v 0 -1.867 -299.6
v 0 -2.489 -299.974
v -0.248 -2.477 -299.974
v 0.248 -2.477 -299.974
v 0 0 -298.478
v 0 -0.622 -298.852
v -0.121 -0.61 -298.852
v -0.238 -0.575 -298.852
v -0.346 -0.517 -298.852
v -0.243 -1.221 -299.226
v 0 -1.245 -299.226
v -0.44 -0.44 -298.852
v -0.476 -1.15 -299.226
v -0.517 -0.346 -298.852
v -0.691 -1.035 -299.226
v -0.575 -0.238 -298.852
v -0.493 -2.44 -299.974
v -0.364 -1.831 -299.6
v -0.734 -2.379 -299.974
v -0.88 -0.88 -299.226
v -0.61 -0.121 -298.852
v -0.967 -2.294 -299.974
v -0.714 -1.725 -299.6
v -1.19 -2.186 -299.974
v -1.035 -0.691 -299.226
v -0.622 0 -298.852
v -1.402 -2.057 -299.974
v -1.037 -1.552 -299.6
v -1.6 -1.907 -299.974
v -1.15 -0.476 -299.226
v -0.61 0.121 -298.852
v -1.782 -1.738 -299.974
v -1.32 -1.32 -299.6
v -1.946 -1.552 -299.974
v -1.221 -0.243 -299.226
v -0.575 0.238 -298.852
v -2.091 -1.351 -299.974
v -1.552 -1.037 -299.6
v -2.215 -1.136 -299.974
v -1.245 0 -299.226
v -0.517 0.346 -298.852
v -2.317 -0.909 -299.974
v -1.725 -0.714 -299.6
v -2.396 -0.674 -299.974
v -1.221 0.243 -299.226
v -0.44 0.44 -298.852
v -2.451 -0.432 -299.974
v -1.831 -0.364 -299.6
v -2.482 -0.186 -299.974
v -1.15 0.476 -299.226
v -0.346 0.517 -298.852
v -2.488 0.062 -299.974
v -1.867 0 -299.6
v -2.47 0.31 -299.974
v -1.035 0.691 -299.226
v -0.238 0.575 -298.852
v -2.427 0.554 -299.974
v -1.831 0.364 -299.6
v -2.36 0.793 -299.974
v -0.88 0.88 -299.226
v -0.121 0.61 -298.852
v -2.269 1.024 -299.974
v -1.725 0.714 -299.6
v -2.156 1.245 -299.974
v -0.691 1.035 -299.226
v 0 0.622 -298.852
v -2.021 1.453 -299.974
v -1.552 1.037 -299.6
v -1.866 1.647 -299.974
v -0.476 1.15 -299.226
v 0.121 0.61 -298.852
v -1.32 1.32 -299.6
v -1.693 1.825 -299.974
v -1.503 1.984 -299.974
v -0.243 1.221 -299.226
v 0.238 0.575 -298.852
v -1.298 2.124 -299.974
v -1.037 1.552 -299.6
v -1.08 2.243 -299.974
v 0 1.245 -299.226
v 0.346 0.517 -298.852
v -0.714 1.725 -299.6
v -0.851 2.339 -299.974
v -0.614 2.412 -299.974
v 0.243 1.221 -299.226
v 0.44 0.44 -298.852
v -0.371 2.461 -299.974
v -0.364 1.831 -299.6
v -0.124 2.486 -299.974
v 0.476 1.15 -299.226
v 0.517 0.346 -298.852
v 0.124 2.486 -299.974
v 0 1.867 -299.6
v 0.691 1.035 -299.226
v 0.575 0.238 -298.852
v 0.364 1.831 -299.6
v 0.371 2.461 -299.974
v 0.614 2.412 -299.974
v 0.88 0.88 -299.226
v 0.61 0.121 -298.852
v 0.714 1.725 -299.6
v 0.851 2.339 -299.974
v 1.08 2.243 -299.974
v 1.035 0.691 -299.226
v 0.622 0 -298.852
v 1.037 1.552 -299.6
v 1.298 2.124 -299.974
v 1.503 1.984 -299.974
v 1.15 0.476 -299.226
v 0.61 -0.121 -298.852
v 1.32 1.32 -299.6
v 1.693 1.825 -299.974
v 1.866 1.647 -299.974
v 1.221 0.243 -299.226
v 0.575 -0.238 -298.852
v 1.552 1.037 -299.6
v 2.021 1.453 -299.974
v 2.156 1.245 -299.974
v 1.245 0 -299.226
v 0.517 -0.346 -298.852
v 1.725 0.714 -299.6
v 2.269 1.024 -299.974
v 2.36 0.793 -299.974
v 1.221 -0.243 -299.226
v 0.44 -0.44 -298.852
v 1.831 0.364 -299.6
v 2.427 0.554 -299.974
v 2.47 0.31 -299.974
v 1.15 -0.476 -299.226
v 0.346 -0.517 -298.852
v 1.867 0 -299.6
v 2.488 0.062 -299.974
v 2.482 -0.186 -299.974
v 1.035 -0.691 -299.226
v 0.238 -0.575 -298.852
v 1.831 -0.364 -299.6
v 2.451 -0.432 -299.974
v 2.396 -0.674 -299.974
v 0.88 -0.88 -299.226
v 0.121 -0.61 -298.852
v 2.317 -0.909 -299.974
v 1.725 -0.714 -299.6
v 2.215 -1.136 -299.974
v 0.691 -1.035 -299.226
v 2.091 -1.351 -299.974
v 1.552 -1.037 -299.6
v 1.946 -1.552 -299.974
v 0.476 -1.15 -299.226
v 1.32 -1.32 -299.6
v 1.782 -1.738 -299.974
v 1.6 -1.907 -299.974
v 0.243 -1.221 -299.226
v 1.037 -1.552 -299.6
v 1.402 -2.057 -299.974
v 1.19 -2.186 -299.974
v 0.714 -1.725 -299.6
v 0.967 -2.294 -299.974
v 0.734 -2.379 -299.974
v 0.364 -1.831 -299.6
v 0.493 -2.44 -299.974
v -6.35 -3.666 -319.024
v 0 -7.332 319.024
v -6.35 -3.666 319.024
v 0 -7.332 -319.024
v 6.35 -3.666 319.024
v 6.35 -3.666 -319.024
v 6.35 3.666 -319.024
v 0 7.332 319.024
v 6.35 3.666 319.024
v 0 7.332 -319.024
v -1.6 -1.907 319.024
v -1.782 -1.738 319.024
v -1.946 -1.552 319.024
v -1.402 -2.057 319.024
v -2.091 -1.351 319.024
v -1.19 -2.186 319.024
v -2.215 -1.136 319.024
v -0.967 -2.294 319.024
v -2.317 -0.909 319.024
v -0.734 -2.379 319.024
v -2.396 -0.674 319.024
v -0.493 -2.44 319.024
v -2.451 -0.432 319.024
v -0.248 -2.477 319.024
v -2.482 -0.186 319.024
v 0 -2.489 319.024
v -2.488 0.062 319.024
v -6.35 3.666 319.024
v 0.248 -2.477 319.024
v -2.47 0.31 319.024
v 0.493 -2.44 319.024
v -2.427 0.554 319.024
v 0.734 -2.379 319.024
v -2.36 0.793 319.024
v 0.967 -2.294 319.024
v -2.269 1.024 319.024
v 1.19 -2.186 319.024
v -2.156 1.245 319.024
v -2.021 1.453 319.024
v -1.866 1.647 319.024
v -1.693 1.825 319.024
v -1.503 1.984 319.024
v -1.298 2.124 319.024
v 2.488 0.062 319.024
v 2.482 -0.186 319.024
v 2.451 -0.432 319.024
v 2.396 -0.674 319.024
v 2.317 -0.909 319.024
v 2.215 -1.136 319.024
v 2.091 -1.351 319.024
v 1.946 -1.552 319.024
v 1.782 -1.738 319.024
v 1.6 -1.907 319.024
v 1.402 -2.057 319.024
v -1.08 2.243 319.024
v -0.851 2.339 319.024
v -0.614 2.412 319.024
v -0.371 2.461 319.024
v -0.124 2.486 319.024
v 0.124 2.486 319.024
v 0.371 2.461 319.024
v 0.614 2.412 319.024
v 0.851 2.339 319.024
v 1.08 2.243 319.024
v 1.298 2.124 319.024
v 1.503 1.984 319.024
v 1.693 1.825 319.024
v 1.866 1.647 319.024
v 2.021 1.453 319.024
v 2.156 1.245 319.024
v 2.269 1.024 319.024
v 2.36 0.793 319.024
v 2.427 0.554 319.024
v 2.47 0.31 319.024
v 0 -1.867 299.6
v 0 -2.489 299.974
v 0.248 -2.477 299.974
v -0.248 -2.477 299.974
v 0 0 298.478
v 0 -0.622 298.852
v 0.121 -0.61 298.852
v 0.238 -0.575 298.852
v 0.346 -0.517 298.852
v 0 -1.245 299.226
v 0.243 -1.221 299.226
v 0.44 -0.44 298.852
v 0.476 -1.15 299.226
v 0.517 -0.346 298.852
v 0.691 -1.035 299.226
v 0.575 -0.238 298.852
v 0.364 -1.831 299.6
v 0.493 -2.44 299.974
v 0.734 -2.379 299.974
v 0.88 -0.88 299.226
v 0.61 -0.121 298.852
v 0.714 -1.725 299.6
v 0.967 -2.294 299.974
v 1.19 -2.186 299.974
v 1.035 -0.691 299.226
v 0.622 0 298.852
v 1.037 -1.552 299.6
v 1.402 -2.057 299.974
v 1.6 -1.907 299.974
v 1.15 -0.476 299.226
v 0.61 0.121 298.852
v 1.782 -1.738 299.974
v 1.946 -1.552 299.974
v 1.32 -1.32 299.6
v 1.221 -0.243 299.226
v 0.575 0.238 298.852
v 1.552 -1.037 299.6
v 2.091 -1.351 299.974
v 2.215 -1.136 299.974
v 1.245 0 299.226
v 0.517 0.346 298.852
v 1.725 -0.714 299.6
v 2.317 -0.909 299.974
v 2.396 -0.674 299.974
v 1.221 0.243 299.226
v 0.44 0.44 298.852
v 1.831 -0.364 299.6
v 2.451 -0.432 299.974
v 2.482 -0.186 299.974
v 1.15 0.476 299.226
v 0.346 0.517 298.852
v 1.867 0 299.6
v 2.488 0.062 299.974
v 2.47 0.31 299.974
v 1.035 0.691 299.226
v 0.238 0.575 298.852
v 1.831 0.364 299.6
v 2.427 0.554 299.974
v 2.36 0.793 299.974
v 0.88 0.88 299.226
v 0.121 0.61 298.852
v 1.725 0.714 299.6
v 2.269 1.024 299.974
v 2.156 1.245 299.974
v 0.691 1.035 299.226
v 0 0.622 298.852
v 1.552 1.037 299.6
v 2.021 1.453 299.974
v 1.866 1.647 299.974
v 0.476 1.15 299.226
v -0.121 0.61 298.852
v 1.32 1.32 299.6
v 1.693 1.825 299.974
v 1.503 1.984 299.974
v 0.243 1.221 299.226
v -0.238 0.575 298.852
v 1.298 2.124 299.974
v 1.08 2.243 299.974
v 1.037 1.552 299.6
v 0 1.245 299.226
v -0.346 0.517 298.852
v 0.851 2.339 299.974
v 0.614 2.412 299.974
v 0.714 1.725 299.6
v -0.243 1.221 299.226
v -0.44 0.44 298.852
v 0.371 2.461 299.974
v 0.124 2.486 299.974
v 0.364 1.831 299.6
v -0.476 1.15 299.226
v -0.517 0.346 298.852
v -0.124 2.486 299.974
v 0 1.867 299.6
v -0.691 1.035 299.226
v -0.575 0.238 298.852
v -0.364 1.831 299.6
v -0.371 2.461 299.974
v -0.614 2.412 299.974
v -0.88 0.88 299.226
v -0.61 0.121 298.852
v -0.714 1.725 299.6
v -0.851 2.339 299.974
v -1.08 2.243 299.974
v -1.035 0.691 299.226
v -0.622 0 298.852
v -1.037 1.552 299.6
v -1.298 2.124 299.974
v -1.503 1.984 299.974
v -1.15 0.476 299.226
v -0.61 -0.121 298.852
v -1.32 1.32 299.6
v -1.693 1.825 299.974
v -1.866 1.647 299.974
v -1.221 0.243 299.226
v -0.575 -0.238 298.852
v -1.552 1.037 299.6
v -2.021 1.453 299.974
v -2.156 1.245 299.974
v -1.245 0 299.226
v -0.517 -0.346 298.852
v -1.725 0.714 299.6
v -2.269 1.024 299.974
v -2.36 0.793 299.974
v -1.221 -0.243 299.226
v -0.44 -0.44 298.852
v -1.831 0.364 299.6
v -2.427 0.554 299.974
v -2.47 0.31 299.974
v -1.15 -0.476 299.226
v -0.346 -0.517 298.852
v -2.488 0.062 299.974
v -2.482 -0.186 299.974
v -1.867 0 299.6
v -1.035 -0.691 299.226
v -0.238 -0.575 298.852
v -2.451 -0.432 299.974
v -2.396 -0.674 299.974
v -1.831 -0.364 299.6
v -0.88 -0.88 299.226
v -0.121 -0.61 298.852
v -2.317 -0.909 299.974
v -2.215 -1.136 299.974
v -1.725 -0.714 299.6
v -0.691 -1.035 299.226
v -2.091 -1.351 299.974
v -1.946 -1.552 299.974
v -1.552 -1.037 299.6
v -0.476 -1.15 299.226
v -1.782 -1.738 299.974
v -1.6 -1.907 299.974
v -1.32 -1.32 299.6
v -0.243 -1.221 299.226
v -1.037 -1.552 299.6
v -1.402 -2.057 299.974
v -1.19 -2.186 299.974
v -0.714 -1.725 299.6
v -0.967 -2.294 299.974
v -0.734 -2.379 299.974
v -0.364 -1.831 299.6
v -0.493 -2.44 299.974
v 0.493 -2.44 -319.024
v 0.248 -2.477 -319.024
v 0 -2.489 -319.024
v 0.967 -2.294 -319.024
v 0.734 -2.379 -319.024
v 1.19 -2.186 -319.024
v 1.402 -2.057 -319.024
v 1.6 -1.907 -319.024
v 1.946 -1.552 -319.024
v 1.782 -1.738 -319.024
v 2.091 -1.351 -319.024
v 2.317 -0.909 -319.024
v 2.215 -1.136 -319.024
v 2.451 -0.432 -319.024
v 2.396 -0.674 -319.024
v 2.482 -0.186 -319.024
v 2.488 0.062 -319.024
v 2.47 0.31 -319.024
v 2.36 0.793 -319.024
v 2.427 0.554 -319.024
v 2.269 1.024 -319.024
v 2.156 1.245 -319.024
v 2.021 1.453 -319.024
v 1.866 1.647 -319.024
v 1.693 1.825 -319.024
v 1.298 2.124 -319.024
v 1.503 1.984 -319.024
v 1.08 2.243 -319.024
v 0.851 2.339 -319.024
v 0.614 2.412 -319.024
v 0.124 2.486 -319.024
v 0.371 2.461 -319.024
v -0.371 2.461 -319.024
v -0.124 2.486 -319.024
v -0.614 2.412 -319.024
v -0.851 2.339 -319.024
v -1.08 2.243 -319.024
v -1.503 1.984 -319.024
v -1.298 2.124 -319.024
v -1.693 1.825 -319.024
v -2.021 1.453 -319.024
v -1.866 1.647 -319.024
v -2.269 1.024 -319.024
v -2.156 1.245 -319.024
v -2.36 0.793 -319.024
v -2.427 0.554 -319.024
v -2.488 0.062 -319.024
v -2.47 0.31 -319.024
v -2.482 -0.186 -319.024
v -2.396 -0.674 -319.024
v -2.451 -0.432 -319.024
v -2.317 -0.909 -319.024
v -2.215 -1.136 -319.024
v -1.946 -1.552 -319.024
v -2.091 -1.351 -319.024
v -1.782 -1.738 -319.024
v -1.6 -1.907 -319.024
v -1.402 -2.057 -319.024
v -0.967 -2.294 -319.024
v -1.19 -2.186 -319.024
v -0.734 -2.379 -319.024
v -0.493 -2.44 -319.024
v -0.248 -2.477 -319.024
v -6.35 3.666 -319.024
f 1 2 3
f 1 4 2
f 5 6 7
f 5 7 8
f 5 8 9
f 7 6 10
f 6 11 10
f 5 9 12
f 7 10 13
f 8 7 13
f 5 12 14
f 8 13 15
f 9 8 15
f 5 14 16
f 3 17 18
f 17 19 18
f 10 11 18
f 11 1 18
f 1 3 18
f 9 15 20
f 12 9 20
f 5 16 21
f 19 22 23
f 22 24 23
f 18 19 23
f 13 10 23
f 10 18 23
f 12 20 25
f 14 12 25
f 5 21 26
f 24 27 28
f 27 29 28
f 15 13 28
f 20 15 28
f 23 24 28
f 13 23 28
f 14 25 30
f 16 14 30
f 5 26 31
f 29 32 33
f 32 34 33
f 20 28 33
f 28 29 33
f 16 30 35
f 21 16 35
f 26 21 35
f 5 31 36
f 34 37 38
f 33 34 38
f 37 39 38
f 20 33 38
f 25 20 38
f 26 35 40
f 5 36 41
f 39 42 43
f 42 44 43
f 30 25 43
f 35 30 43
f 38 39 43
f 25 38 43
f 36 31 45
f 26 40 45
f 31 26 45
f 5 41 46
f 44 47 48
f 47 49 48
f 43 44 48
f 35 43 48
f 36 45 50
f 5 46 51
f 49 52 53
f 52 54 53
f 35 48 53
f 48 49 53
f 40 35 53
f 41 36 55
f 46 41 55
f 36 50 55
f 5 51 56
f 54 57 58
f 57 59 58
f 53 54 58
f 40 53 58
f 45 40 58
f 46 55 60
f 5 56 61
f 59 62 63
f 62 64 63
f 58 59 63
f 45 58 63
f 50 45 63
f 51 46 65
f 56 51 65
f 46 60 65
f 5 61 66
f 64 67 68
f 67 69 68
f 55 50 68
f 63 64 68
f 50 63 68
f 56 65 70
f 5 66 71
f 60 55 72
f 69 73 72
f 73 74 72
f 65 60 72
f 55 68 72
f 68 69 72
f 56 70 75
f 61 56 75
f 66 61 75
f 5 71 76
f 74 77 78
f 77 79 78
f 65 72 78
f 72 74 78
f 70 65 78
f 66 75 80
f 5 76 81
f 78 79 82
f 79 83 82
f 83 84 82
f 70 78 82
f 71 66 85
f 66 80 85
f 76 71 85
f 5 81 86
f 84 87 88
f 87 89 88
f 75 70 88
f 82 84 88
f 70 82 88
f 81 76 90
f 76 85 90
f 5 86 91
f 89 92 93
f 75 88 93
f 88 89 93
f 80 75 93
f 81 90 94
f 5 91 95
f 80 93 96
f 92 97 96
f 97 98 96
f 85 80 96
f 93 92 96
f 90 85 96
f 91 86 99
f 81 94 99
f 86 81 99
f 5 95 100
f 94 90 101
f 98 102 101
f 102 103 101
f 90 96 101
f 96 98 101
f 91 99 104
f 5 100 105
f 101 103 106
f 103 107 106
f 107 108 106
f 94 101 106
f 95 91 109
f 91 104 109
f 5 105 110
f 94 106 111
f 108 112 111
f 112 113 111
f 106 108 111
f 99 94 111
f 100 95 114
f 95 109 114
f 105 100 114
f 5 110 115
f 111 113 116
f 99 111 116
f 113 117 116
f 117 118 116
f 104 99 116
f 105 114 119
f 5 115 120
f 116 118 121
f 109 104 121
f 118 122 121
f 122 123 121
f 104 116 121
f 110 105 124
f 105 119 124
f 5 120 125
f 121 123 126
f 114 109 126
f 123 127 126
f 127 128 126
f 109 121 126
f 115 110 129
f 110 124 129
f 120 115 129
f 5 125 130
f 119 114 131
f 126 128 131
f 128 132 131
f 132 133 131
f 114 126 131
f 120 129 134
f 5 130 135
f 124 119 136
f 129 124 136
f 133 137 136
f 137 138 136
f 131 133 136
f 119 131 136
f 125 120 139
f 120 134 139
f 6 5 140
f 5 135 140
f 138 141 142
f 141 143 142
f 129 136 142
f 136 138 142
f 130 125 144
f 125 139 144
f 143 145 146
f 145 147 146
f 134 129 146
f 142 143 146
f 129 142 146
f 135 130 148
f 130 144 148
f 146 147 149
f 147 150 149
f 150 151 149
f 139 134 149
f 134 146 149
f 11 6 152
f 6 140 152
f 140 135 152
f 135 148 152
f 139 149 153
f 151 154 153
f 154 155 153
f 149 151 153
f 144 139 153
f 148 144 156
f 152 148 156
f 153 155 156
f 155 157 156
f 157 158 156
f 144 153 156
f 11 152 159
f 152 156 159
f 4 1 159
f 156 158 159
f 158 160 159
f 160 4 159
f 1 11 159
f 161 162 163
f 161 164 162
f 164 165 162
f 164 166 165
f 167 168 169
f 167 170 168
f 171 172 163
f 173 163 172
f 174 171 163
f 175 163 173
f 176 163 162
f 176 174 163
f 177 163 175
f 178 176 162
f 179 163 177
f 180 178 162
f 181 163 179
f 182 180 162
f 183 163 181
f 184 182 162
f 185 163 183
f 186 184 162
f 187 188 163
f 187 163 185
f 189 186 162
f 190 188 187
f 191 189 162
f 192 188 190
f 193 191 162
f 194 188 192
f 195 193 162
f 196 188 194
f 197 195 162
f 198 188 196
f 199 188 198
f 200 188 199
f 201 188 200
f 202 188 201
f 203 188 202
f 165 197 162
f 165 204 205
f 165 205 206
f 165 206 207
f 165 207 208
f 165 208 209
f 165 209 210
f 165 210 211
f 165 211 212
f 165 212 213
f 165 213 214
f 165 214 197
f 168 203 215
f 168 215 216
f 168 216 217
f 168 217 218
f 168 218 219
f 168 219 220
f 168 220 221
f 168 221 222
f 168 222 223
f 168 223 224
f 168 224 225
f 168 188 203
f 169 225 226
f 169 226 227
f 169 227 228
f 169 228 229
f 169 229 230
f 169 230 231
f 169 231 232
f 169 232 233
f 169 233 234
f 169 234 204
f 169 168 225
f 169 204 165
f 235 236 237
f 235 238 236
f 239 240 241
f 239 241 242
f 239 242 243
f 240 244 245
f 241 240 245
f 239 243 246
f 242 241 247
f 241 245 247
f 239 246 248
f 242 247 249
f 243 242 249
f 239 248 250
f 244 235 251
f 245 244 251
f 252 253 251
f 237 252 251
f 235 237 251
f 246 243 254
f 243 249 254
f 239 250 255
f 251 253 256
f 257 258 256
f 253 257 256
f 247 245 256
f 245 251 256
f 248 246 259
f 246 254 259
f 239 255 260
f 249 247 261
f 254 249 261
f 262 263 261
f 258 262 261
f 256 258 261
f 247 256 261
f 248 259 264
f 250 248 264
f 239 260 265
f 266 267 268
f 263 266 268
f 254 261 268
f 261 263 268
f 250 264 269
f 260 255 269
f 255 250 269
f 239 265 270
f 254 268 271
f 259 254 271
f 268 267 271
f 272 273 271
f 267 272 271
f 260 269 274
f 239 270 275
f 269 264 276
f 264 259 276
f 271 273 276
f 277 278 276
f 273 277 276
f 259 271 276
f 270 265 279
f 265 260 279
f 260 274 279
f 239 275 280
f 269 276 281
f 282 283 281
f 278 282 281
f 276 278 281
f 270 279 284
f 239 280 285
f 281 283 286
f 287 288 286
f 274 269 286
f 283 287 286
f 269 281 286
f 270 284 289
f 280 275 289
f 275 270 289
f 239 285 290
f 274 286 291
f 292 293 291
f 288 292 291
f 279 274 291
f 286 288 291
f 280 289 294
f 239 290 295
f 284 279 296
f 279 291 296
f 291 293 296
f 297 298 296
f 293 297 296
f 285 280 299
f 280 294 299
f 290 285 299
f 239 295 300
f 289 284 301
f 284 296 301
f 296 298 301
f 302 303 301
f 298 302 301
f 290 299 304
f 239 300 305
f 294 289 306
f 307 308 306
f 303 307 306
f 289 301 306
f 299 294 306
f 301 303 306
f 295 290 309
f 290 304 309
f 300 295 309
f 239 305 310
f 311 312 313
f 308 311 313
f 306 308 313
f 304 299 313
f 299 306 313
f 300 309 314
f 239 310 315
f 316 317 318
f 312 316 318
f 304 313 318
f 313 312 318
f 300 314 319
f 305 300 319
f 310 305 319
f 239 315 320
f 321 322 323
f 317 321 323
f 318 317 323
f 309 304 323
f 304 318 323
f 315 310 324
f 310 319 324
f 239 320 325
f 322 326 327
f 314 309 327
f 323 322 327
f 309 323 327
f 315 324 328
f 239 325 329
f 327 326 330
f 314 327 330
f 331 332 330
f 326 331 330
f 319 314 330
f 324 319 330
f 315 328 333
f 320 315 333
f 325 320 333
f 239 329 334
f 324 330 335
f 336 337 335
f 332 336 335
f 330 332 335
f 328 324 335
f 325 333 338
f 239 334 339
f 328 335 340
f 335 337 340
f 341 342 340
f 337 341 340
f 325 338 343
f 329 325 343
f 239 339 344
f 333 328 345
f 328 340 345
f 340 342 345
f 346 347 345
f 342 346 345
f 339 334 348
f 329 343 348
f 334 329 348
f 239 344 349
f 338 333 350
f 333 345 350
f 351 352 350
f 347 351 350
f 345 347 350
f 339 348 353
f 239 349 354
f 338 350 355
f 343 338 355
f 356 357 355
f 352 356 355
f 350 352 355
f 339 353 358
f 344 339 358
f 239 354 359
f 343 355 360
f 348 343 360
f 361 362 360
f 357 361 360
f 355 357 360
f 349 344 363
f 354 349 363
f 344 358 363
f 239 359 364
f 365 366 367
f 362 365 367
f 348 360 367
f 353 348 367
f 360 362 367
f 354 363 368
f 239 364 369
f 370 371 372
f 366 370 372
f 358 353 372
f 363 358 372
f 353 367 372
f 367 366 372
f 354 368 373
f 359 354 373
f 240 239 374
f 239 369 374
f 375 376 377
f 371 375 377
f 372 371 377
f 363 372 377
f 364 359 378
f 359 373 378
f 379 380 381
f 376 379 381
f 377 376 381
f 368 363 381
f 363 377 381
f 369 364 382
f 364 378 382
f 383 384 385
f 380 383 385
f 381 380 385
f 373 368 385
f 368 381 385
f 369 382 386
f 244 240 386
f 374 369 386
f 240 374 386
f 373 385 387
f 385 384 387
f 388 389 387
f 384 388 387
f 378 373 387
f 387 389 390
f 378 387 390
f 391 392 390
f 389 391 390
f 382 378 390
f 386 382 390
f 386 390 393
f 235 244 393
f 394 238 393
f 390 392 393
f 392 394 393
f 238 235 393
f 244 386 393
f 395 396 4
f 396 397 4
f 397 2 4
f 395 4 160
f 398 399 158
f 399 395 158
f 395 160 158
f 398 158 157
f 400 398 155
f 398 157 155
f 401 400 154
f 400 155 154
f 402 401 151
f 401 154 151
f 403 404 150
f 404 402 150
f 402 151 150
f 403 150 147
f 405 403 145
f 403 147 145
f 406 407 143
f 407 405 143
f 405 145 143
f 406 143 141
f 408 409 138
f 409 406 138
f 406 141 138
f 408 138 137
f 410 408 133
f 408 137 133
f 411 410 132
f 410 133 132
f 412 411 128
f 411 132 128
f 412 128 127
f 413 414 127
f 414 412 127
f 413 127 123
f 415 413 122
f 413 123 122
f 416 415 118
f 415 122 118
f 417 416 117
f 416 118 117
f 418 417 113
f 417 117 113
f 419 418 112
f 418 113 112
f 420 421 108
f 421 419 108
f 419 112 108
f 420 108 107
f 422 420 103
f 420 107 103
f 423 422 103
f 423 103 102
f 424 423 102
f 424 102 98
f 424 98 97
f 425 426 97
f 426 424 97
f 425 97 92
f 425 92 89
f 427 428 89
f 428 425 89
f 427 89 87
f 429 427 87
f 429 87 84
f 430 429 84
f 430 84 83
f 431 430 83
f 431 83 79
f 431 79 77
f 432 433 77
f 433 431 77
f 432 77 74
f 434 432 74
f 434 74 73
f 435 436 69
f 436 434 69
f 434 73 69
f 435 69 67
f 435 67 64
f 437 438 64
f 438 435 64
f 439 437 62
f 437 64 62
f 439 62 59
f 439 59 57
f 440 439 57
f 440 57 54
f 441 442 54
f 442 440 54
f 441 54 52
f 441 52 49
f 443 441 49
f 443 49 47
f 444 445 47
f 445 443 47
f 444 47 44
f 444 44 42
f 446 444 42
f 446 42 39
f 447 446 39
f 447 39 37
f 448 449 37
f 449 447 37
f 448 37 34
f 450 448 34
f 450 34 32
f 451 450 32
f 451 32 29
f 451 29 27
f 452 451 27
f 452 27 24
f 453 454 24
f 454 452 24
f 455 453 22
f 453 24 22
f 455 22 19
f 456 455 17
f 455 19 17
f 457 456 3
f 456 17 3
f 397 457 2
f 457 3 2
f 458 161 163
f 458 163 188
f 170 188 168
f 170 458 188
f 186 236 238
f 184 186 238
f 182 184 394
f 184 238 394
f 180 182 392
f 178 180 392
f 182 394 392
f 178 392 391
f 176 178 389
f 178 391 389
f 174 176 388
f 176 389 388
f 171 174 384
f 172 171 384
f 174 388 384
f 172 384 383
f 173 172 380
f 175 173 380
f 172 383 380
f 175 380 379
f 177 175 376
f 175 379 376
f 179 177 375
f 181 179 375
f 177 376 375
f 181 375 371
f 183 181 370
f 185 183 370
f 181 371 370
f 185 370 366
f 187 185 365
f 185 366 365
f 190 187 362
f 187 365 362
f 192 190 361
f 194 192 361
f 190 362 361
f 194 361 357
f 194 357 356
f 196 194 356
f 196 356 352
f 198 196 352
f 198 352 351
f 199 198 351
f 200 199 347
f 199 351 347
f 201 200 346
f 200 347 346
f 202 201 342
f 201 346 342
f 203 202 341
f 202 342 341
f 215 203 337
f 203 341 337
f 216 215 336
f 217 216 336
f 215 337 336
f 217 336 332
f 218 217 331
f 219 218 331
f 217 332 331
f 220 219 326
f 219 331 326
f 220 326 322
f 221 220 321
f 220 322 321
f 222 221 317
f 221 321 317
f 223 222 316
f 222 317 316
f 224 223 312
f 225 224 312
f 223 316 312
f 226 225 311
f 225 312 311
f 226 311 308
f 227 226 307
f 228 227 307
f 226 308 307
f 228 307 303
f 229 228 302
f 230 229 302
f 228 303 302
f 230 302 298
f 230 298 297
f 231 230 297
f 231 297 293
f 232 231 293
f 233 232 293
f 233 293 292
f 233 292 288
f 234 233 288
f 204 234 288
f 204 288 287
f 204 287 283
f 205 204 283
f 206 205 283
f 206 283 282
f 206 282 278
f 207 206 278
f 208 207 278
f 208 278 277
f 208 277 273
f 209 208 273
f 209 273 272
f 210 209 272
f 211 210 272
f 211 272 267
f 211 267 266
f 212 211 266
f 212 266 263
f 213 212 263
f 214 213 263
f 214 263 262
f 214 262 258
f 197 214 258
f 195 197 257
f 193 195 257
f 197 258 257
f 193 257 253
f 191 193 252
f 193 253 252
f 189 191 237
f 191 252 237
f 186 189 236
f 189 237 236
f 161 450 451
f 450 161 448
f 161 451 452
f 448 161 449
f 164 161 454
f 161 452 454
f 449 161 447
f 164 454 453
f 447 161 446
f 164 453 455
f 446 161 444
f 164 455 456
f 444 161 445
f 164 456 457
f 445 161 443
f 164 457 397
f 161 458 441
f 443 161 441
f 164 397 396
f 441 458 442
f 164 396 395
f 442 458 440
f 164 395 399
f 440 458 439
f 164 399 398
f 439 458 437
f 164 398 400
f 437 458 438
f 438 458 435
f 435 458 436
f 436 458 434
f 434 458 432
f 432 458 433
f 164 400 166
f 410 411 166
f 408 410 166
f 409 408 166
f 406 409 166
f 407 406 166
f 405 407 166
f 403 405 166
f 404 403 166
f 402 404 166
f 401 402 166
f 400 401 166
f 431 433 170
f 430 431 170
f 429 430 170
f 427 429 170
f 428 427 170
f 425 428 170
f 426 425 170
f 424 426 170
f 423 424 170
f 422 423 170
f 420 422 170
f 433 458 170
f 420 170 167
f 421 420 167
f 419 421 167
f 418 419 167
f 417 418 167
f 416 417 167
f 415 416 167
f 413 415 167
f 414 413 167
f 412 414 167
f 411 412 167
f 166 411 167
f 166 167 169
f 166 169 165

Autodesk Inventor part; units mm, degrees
ref_plane "YZ Plane" through (0, 0, 0) normal (1, 0, 0) x (0, 1, 0)
ref_plane "XZ Plane" through (0, 0, 0) normal (0, 1, 0) x (-1, 0, 0)
ref_plane "XY Plane" through (0, 0, 0) normal (0, 0, 1) x (1, 0, 0)
sketch "Sketch1" plane through (0, 0, 0) normal (0, 0, 1) x (1, 0, 0)
  line L0 (0, 7.3323) -> (6.35, 3.6662)
  line L1 (6.35, 3.6662) -> (6.35, -3.6662)
  line L2 (6.35, -3.6662) -> (0, -7.3323)
  line L3 (0, -7.3323) -> (-6.35, -3.6662)
  line L4 (-6.35, -3.6662) -> (-6.35, 3.6662)
  line L5 (-6.35, 3.6662) -> (0, 7.3323)
  point P0 (0, 0)
  point P1 (0, 0)
  dimension "d1" = 12.7
extrude "Extrusion1" add sketch "Sketch1" along normal mid plane 638.048
sketch "Sketch2" plane through (0, 0, 319.024) normal (0, 0, 1) x (1, 0, 0)
  point P0 (0, 0)
hole "Hole1" at (0, 0, 319.024) direction (0, 0, -1) diameter 4.9784 depth 19.05 tip angle 118 thread size "1/4-20 UNC" class "2B" standard "ANSI Unified Screw Threads"
mirror "Mirror1" about plane through (0, 0, 0) normal (0, 0, 1) of "Hole1"
properties part number "0.5_Bottom_INTAKE_SHAFT" material "Aluminum, 6061-T6"
